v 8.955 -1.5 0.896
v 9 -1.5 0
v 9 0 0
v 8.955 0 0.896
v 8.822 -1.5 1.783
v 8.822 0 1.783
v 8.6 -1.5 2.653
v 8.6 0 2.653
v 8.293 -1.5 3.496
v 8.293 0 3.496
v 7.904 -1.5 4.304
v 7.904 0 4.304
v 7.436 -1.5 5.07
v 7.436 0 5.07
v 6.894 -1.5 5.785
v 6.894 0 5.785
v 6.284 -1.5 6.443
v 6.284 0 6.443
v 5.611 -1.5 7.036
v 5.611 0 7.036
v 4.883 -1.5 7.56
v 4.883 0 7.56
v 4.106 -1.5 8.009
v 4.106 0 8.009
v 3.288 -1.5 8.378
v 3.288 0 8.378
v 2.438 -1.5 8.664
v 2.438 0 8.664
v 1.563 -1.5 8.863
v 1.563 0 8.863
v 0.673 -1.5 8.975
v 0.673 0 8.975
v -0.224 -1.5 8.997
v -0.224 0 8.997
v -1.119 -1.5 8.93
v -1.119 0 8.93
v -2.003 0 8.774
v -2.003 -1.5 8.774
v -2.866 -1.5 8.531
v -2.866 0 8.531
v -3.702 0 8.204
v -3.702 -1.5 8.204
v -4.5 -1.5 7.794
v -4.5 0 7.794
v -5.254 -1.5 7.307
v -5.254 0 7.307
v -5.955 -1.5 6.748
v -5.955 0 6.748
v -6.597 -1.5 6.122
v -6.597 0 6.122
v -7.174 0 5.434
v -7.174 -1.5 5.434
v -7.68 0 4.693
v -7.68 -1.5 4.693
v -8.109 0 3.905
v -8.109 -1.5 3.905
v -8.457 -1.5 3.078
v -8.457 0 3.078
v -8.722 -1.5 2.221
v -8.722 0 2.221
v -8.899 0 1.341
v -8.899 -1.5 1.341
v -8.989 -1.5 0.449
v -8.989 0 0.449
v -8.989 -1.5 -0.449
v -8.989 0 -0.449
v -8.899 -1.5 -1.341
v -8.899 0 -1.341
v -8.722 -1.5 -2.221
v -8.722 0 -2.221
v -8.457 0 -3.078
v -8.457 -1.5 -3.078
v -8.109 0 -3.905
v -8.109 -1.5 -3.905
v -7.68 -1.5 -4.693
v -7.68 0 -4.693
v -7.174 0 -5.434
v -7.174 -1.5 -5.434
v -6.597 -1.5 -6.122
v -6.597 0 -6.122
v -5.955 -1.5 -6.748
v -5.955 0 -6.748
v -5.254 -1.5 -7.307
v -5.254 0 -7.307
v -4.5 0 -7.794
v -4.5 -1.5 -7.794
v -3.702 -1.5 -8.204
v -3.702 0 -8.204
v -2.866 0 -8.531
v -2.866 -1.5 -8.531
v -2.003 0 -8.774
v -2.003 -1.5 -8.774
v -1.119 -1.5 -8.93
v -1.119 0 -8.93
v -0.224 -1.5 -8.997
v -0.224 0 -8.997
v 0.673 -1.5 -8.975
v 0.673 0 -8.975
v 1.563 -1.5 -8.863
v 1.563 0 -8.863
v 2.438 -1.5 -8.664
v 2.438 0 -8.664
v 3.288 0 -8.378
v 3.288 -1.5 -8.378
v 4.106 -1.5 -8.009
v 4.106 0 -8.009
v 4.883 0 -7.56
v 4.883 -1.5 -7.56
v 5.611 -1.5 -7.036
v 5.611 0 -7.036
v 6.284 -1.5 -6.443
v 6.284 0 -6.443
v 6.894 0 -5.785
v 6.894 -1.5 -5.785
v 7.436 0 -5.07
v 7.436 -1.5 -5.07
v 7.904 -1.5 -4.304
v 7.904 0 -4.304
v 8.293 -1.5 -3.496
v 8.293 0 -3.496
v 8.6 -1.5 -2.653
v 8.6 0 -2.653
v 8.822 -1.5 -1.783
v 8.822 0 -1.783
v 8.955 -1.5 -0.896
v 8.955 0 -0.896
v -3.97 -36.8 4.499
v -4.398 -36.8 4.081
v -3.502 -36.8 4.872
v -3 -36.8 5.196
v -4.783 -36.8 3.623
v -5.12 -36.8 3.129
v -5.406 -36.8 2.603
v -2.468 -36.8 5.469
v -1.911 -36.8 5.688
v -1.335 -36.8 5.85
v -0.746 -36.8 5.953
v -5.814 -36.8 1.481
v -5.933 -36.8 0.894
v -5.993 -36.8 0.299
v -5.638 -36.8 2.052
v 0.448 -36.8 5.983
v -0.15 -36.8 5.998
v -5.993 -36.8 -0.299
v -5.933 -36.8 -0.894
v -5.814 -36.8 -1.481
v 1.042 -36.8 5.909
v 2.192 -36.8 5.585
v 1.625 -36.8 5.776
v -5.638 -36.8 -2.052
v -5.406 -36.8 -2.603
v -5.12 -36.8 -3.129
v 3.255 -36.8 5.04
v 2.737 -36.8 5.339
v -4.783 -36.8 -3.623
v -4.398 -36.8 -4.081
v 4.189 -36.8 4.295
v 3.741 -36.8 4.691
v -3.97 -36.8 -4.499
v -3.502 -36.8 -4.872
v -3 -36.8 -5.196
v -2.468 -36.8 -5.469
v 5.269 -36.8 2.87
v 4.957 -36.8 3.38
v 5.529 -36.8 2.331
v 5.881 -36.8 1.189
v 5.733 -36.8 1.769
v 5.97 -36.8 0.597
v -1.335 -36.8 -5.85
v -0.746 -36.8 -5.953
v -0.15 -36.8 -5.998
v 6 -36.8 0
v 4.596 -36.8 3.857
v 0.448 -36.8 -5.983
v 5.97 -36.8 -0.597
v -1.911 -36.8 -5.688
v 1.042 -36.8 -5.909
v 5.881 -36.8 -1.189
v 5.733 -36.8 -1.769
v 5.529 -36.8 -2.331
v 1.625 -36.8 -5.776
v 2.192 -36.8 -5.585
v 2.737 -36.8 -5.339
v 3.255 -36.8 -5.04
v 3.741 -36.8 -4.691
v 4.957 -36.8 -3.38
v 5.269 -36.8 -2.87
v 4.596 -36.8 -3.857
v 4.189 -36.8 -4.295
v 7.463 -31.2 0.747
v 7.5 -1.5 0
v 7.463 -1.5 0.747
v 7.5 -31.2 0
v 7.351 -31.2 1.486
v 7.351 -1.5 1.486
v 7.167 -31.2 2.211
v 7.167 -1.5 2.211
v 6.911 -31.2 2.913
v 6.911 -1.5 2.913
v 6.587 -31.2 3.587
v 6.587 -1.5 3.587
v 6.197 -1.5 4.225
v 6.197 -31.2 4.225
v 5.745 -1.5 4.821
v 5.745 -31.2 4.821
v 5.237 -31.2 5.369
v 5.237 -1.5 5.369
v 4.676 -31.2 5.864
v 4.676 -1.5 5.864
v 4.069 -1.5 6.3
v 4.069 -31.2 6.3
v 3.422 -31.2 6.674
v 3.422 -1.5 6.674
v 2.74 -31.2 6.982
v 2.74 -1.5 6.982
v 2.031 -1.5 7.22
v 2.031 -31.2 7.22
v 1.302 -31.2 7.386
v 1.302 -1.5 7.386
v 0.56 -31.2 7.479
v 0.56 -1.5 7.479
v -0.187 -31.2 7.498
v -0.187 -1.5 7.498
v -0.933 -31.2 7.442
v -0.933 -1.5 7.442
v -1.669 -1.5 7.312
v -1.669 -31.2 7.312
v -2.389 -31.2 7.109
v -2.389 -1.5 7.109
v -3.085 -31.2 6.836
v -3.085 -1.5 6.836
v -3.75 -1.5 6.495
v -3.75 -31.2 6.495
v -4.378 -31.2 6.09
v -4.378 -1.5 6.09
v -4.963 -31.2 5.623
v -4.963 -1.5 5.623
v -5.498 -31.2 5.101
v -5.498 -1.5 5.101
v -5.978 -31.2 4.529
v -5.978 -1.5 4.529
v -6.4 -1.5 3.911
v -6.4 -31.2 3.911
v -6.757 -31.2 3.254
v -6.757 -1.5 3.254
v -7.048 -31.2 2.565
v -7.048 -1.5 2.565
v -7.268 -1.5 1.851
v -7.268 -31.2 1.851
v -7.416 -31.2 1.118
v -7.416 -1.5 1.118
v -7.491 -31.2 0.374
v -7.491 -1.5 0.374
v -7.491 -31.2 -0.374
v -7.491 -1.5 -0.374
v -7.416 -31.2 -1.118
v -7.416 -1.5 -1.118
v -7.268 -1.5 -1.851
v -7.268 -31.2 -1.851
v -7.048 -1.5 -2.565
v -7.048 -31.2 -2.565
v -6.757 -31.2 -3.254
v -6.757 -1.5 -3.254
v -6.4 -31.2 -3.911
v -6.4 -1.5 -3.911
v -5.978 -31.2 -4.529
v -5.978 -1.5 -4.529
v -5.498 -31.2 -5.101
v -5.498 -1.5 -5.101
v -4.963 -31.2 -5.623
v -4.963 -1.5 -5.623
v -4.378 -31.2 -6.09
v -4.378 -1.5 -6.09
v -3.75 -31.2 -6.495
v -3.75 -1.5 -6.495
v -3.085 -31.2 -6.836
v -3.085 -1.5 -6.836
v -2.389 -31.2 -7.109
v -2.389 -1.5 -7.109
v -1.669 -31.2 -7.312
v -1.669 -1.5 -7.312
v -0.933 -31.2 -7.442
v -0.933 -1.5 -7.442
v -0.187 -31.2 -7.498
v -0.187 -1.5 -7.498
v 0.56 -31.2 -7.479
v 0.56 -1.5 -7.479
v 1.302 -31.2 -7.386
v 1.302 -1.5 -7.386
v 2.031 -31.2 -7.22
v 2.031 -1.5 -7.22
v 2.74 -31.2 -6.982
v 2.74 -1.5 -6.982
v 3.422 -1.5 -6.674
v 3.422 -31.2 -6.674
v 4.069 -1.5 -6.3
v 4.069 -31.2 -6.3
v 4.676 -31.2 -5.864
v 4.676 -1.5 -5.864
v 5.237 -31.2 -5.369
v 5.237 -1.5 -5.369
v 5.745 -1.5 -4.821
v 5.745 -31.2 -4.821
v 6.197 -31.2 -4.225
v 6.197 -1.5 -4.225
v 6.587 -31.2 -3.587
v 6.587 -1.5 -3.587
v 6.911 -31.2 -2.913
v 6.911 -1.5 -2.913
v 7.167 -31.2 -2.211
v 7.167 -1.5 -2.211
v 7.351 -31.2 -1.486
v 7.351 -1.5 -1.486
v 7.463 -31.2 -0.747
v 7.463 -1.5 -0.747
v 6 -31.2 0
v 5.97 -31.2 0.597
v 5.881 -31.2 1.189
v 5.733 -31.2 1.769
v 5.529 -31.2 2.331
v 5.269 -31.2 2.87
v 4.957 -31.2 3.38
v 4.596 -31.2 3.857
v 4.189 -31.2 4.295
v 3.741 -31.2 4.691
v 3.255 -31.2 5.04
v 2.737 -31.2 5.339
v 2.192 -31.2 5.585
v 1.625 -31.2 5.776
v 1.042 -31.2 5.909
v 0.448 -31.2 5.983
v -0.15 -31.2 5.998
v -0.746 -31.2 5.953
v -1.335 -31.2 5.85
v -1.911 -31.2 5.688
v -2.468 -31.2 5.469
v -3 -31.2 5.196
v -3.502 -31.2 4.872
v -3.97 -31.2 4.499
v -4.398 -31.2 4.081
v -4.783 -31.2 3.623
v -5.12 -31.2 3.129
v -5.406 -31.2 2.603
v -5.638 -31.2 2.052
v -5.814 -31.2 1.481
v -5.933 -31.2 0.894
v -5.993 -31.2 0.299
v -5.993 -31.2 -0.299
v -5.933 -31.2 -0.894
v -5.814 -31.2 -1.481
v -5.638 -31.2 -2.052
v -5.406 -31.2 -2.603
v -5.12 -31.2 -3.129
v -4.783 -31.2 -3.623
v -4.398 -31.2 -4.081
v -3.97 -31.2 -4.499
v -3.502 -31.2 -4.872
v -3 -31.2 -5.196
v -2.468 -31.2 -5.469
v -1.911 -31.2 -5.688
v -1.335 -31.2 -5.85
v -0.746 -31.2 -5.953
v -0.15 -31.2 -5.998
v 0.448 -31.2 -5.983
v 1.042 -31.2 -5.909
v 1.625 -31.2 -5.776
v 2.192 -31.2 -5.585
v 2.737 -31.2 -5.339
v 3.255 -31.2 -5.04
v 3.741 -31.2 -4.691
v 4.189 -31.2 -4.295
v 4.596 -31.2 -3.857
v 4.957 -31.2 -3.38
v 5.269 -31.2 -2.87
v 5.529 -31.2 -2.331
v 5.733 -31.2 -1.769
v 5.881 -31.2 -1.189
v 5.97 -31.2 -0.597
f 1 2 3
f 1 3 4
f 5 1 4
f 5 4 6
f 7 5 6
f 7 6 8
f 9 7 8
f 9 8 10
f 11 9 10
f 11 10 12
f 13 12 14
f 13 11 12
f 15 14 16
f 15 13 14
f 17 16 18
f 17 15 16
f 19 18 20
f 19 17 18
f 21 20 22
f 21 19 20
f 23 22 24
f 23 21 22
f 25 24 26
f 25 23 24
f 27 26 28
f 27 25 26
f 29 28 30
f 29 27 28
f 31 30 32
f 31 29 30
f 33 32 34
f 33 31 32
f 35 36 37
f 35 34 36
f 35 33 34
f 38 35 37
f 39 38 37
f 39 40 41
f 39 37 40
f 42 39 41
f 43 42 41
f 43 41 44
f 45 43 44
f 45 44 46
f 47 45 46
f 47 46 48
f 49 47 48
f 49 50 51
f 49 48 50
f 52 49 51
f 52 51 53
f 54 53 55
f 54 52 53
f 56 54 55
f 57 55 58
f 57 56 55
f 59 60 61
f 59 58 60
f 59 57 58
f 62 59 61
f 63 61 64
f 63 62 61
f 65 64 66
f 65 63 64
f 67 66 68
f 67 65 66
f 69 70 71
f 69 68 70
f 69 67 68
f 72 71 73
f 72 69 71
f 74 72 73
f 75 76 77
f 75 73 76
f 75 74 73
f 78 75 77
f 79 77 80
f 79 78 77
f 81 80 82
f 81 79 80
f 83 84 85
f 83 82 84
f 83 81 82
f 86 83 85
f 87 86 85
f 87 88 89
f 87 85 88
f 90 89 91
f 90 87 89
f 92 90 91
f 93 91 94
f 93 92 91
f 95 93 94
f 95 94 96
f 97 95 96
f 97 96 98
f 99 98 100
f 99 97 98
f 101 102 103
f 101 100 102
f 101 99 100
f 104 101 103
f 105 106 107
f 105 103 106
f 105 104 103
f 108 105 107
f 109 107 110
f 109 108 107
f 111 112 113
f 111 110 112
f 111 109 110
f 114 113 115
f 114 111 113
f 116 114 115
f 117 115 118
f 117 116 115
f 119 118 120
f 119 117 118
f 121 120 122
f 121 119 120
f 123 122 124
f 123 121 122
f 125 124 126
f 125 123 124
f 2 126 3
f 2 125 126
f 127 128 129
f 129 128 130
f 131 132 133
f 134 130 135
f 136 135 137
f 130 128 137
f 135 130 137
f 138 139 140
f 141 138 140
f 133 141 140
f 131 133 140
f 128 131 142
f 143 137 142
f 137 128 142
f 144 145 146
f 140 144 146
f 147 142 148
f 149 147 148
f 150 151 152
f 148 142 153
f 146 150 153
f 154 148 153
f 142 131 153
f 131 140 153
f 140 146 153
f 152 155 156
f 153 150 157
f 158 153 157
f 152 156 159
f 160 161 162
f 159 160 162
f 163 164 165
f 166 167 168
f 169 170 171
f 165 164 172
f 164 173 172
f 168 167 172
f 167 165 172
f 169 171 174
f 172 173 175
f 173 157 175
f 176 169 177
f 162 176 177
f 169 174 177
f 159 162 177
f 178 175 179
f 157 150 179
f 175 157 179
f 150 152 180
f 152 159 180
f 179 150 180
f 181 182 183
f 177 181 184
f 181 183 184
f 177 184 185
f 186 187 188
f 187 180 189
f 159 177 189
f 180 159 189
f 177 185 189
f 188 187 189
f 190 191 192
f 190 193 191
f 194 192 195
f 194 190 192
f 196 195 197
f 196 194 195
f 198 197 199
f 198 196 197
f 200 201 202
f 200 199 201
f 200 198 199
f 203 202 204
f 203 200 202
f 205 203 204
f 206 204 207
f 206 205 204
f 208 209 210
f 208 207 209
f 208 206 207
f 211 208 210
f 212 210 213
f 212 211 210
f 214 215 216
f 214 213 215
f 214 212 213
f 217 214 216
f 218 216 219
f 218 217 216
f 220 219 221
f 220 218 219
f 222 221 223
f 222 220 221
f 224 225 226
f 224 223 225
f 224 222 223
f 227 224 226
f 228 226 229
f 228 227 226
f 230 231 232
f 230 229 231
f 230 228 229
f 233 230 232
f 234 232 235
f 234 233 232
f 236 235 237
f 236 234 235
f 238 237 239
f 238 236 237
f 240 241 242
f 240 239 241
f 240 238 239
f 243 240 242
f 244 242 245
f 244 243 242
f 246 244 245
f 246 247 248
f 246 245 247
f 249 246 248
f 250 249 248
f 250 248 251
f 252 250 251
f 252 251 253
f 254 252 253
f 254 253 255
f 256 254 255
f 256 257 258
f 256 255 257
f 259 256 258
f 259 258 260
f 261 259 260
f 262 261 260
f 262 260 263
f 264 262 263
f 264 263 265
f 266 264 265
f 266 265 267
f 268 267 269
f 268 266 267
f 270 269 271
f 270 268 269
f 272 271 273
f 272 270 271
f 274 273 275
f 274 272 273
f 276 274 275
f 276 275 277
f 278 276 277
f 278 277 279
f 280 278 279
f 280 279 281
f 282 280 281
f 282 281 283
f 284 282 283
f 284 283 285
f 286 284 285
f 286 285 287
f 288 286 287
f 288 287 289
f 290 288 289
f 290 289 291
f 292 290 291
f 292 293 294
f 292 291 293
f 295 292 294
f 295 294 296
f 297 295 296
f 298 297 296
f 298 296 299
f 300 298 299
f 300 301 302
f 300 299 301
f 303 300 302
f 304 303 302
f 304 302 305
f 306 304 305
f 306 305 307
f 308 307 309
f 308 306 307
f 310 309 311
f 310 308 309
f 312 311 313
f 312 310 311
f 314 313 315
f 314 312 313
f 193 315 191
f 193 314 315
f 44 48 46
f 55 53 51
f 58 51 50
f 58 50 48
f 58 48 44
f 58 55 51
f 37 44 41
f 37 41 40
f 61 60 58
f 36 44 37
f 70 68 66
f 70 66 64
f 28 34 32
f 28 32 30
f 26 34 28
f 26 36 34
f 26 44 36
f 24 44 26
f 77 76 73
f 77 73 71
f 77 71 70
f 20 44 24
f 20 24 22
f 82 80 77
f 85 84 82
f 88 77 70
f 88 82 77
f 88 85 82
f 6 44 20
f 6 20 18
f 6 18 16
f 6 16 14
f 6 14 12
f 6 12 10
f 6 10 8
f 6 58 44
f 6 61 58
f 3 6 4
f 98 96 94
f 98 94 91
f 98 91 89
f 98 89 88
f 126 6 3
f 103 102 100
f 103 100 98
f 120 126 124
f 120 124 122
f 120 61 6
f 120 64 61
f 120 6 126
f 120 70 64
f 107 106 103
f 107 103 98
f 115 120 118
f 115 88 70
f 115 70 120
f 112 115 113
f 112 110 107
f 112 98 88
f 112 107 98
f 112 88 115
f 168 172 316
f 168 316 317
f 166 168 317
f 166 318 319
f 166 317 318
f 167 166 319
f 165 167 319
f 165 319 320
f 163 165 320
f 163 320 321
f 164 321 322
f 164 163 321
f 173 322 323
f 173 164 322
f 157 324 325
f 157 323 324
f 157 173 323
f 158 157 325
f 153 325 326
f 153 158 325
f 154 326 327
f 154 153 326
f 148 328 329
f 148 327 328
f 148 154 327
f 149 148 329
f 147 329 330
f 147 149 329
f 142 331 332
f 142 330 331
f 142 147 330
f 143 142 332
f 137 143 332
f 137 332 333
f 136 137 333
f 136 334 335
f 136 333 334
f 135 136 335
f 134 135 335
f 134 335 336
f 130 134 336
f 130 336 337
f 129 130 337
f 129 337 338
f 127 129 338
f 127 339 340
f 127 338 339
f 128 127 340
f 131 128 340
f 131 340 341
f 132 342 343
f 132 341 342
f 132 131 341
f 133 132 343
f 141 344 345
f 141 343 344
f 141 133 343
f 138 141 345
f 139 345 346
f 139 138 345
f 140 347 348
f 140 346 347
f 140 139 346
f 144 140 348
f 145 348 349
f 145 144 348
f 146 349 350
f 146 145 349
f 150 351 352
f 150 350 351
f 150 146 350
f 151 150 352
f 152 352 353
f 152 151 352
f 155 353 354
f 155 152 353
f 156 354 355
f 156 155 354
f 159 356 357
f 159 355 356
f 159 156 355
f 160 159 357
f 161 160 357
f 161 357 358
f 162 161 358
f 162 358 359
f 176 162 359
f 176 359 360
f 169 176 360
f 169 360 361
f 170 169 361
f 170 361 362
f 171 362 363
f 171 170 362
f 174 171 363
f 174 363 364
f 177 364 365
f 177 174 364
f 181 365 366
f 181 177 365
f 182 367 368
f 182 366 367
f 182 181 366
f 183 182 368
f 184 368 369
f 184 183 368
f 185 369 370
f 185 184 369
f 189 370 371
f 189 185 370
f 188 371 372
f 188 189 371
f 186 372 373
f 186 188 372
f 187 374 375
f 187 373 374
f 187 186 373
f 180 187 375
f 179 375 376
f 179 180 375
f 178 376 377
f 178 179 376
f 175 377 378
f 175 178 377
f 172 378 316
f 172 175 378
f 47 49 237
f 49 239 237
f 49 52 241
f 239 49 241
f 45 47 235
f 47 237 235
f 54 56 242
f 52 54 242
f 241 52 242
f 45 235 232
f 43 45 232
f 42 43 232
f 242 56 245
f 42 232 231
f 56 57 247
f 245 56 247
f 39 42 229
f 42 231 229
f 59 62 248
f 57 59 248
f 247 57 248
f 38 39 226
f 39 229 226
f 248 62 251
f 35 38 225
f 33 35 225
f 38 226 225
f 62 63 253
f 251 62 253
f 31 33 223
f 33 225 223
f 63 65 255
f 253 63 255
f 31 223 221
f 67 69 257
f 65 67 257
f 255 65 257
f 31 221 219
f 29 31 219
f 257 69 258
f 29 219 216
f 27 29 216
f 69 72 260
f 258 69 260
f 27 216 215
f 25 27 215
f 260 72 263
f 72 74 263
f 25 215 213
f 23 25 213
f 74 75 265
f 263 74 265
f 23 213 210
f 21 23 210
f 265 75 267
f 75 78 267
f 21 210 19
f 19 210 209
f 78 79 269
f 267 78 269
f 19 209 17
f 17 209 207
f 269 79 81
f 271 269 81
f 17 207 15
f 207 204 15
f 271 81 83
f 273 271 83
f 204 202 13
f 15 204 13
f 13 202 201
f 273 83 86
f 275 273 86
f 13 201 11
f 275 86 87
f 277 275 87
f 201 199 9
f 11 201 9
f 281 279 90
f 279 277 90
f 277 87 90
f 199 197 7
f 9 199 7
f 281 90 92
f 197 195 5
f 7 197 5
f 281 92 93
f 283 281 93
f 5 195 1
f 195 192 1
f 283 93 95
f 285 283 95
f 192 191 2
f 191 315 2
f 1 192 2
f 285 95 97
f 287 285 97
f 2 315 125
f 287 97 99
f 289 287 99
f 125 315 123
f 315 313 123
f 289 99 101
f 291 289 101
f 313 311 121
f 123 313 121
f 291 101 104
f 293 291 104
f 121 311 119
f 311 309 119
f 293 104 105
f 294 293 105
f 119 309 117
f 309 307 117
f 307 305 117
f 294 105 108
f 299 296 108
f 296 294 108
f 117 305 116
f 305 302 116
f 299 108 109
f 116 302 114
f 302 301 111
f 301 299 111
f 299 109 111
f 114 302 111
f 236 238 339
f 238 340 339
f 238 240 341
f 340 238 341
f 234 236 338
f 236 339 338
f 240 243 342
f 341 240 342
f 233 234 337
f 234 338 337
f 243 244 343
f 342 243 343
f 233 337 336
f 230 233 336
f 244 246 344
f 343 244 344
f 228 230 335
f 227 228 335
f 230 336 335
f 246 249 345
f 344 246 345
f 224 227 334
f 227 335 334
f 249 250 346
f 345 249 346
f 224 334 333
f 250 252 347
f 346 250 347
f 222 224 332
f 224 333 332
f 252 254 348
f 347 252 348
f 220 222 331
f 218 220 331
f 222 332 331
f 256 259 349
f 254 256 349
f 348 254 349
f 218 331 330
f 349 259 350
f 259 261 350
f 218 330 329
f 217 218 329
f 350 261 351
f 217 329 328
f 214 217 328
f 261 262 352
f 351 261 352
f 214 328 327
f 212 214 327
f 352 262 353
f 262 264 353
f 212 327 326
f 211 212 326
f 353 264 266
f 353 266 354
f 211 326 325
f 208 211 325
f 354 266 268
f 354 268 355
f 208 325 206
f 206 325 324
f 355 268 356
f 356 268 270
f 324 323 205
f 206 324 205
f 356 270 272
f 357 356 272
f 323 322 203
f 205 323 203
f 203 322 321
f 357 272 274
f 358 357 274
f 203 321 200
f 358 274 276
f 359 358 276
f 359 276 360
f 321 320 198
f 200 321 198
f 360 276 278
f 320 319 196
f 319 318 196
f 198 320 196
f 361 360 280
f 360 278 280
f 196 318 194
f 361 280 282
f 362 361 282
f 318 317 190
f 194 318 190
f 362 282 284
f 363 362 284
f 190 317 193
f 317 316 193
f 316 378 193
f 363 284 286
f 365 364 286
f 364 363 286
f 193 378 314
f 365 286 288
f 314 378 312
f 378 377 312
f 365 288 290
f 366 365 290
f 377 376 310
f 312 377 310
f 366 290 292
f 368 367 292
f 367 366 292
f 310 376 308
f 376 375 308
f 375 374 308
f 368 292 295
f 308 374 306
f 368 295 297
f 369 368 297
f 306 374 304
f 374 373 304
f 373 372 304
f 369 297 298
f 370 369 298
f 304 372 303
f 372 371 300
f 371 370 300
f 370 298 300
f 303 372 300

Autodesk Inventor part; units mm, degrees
ref_plane "YZ Plane" through (0, 0, 0) normal (1, 0, 0) x (0, 1, 0)
ref_plane "XZ Plane" through (0, 0, 0) normal (0, 1, 0) x (-1, 0, 0)
ref_plane "XY Plane" through (0, 0, 0) normal (0, 0, 1) x (1, 0, 0)
sketch "Sketch1" plane through (0, 0, 0) normal (0, 0, 1) x (1, 0, 0)
  line L0 (0, 0) -> (9, 0)
  line L1 (9, 0) -> (9, -1.5)
  line L2 (9, -1.5) -> (7.5, -1.5)
  line L3 (7.5, -1.5) -> (7.5, -31.2)
  line L4 (7.5, -31.2) -> (6, -31.2)
  line L5 (6, -31.2) -> (6, -36.8)
  line L6 (6, -36.8) -> (0, -36.8)
  line L7 (0, -36.8) -> (0, 0)
  dimension "d0" = 9
  dimension "d1" = 1.5
  dimension "d2" = 29.7
  dimension "d3" = 5.6
  dimension "d4" = 7.5
  dimension "d5" = 6
revolve "Revolution1" add sketch "Sketch1" angle 360 about axis through (0, -36.8, 0) along (0, 1, 0)
properties part number "Button"
